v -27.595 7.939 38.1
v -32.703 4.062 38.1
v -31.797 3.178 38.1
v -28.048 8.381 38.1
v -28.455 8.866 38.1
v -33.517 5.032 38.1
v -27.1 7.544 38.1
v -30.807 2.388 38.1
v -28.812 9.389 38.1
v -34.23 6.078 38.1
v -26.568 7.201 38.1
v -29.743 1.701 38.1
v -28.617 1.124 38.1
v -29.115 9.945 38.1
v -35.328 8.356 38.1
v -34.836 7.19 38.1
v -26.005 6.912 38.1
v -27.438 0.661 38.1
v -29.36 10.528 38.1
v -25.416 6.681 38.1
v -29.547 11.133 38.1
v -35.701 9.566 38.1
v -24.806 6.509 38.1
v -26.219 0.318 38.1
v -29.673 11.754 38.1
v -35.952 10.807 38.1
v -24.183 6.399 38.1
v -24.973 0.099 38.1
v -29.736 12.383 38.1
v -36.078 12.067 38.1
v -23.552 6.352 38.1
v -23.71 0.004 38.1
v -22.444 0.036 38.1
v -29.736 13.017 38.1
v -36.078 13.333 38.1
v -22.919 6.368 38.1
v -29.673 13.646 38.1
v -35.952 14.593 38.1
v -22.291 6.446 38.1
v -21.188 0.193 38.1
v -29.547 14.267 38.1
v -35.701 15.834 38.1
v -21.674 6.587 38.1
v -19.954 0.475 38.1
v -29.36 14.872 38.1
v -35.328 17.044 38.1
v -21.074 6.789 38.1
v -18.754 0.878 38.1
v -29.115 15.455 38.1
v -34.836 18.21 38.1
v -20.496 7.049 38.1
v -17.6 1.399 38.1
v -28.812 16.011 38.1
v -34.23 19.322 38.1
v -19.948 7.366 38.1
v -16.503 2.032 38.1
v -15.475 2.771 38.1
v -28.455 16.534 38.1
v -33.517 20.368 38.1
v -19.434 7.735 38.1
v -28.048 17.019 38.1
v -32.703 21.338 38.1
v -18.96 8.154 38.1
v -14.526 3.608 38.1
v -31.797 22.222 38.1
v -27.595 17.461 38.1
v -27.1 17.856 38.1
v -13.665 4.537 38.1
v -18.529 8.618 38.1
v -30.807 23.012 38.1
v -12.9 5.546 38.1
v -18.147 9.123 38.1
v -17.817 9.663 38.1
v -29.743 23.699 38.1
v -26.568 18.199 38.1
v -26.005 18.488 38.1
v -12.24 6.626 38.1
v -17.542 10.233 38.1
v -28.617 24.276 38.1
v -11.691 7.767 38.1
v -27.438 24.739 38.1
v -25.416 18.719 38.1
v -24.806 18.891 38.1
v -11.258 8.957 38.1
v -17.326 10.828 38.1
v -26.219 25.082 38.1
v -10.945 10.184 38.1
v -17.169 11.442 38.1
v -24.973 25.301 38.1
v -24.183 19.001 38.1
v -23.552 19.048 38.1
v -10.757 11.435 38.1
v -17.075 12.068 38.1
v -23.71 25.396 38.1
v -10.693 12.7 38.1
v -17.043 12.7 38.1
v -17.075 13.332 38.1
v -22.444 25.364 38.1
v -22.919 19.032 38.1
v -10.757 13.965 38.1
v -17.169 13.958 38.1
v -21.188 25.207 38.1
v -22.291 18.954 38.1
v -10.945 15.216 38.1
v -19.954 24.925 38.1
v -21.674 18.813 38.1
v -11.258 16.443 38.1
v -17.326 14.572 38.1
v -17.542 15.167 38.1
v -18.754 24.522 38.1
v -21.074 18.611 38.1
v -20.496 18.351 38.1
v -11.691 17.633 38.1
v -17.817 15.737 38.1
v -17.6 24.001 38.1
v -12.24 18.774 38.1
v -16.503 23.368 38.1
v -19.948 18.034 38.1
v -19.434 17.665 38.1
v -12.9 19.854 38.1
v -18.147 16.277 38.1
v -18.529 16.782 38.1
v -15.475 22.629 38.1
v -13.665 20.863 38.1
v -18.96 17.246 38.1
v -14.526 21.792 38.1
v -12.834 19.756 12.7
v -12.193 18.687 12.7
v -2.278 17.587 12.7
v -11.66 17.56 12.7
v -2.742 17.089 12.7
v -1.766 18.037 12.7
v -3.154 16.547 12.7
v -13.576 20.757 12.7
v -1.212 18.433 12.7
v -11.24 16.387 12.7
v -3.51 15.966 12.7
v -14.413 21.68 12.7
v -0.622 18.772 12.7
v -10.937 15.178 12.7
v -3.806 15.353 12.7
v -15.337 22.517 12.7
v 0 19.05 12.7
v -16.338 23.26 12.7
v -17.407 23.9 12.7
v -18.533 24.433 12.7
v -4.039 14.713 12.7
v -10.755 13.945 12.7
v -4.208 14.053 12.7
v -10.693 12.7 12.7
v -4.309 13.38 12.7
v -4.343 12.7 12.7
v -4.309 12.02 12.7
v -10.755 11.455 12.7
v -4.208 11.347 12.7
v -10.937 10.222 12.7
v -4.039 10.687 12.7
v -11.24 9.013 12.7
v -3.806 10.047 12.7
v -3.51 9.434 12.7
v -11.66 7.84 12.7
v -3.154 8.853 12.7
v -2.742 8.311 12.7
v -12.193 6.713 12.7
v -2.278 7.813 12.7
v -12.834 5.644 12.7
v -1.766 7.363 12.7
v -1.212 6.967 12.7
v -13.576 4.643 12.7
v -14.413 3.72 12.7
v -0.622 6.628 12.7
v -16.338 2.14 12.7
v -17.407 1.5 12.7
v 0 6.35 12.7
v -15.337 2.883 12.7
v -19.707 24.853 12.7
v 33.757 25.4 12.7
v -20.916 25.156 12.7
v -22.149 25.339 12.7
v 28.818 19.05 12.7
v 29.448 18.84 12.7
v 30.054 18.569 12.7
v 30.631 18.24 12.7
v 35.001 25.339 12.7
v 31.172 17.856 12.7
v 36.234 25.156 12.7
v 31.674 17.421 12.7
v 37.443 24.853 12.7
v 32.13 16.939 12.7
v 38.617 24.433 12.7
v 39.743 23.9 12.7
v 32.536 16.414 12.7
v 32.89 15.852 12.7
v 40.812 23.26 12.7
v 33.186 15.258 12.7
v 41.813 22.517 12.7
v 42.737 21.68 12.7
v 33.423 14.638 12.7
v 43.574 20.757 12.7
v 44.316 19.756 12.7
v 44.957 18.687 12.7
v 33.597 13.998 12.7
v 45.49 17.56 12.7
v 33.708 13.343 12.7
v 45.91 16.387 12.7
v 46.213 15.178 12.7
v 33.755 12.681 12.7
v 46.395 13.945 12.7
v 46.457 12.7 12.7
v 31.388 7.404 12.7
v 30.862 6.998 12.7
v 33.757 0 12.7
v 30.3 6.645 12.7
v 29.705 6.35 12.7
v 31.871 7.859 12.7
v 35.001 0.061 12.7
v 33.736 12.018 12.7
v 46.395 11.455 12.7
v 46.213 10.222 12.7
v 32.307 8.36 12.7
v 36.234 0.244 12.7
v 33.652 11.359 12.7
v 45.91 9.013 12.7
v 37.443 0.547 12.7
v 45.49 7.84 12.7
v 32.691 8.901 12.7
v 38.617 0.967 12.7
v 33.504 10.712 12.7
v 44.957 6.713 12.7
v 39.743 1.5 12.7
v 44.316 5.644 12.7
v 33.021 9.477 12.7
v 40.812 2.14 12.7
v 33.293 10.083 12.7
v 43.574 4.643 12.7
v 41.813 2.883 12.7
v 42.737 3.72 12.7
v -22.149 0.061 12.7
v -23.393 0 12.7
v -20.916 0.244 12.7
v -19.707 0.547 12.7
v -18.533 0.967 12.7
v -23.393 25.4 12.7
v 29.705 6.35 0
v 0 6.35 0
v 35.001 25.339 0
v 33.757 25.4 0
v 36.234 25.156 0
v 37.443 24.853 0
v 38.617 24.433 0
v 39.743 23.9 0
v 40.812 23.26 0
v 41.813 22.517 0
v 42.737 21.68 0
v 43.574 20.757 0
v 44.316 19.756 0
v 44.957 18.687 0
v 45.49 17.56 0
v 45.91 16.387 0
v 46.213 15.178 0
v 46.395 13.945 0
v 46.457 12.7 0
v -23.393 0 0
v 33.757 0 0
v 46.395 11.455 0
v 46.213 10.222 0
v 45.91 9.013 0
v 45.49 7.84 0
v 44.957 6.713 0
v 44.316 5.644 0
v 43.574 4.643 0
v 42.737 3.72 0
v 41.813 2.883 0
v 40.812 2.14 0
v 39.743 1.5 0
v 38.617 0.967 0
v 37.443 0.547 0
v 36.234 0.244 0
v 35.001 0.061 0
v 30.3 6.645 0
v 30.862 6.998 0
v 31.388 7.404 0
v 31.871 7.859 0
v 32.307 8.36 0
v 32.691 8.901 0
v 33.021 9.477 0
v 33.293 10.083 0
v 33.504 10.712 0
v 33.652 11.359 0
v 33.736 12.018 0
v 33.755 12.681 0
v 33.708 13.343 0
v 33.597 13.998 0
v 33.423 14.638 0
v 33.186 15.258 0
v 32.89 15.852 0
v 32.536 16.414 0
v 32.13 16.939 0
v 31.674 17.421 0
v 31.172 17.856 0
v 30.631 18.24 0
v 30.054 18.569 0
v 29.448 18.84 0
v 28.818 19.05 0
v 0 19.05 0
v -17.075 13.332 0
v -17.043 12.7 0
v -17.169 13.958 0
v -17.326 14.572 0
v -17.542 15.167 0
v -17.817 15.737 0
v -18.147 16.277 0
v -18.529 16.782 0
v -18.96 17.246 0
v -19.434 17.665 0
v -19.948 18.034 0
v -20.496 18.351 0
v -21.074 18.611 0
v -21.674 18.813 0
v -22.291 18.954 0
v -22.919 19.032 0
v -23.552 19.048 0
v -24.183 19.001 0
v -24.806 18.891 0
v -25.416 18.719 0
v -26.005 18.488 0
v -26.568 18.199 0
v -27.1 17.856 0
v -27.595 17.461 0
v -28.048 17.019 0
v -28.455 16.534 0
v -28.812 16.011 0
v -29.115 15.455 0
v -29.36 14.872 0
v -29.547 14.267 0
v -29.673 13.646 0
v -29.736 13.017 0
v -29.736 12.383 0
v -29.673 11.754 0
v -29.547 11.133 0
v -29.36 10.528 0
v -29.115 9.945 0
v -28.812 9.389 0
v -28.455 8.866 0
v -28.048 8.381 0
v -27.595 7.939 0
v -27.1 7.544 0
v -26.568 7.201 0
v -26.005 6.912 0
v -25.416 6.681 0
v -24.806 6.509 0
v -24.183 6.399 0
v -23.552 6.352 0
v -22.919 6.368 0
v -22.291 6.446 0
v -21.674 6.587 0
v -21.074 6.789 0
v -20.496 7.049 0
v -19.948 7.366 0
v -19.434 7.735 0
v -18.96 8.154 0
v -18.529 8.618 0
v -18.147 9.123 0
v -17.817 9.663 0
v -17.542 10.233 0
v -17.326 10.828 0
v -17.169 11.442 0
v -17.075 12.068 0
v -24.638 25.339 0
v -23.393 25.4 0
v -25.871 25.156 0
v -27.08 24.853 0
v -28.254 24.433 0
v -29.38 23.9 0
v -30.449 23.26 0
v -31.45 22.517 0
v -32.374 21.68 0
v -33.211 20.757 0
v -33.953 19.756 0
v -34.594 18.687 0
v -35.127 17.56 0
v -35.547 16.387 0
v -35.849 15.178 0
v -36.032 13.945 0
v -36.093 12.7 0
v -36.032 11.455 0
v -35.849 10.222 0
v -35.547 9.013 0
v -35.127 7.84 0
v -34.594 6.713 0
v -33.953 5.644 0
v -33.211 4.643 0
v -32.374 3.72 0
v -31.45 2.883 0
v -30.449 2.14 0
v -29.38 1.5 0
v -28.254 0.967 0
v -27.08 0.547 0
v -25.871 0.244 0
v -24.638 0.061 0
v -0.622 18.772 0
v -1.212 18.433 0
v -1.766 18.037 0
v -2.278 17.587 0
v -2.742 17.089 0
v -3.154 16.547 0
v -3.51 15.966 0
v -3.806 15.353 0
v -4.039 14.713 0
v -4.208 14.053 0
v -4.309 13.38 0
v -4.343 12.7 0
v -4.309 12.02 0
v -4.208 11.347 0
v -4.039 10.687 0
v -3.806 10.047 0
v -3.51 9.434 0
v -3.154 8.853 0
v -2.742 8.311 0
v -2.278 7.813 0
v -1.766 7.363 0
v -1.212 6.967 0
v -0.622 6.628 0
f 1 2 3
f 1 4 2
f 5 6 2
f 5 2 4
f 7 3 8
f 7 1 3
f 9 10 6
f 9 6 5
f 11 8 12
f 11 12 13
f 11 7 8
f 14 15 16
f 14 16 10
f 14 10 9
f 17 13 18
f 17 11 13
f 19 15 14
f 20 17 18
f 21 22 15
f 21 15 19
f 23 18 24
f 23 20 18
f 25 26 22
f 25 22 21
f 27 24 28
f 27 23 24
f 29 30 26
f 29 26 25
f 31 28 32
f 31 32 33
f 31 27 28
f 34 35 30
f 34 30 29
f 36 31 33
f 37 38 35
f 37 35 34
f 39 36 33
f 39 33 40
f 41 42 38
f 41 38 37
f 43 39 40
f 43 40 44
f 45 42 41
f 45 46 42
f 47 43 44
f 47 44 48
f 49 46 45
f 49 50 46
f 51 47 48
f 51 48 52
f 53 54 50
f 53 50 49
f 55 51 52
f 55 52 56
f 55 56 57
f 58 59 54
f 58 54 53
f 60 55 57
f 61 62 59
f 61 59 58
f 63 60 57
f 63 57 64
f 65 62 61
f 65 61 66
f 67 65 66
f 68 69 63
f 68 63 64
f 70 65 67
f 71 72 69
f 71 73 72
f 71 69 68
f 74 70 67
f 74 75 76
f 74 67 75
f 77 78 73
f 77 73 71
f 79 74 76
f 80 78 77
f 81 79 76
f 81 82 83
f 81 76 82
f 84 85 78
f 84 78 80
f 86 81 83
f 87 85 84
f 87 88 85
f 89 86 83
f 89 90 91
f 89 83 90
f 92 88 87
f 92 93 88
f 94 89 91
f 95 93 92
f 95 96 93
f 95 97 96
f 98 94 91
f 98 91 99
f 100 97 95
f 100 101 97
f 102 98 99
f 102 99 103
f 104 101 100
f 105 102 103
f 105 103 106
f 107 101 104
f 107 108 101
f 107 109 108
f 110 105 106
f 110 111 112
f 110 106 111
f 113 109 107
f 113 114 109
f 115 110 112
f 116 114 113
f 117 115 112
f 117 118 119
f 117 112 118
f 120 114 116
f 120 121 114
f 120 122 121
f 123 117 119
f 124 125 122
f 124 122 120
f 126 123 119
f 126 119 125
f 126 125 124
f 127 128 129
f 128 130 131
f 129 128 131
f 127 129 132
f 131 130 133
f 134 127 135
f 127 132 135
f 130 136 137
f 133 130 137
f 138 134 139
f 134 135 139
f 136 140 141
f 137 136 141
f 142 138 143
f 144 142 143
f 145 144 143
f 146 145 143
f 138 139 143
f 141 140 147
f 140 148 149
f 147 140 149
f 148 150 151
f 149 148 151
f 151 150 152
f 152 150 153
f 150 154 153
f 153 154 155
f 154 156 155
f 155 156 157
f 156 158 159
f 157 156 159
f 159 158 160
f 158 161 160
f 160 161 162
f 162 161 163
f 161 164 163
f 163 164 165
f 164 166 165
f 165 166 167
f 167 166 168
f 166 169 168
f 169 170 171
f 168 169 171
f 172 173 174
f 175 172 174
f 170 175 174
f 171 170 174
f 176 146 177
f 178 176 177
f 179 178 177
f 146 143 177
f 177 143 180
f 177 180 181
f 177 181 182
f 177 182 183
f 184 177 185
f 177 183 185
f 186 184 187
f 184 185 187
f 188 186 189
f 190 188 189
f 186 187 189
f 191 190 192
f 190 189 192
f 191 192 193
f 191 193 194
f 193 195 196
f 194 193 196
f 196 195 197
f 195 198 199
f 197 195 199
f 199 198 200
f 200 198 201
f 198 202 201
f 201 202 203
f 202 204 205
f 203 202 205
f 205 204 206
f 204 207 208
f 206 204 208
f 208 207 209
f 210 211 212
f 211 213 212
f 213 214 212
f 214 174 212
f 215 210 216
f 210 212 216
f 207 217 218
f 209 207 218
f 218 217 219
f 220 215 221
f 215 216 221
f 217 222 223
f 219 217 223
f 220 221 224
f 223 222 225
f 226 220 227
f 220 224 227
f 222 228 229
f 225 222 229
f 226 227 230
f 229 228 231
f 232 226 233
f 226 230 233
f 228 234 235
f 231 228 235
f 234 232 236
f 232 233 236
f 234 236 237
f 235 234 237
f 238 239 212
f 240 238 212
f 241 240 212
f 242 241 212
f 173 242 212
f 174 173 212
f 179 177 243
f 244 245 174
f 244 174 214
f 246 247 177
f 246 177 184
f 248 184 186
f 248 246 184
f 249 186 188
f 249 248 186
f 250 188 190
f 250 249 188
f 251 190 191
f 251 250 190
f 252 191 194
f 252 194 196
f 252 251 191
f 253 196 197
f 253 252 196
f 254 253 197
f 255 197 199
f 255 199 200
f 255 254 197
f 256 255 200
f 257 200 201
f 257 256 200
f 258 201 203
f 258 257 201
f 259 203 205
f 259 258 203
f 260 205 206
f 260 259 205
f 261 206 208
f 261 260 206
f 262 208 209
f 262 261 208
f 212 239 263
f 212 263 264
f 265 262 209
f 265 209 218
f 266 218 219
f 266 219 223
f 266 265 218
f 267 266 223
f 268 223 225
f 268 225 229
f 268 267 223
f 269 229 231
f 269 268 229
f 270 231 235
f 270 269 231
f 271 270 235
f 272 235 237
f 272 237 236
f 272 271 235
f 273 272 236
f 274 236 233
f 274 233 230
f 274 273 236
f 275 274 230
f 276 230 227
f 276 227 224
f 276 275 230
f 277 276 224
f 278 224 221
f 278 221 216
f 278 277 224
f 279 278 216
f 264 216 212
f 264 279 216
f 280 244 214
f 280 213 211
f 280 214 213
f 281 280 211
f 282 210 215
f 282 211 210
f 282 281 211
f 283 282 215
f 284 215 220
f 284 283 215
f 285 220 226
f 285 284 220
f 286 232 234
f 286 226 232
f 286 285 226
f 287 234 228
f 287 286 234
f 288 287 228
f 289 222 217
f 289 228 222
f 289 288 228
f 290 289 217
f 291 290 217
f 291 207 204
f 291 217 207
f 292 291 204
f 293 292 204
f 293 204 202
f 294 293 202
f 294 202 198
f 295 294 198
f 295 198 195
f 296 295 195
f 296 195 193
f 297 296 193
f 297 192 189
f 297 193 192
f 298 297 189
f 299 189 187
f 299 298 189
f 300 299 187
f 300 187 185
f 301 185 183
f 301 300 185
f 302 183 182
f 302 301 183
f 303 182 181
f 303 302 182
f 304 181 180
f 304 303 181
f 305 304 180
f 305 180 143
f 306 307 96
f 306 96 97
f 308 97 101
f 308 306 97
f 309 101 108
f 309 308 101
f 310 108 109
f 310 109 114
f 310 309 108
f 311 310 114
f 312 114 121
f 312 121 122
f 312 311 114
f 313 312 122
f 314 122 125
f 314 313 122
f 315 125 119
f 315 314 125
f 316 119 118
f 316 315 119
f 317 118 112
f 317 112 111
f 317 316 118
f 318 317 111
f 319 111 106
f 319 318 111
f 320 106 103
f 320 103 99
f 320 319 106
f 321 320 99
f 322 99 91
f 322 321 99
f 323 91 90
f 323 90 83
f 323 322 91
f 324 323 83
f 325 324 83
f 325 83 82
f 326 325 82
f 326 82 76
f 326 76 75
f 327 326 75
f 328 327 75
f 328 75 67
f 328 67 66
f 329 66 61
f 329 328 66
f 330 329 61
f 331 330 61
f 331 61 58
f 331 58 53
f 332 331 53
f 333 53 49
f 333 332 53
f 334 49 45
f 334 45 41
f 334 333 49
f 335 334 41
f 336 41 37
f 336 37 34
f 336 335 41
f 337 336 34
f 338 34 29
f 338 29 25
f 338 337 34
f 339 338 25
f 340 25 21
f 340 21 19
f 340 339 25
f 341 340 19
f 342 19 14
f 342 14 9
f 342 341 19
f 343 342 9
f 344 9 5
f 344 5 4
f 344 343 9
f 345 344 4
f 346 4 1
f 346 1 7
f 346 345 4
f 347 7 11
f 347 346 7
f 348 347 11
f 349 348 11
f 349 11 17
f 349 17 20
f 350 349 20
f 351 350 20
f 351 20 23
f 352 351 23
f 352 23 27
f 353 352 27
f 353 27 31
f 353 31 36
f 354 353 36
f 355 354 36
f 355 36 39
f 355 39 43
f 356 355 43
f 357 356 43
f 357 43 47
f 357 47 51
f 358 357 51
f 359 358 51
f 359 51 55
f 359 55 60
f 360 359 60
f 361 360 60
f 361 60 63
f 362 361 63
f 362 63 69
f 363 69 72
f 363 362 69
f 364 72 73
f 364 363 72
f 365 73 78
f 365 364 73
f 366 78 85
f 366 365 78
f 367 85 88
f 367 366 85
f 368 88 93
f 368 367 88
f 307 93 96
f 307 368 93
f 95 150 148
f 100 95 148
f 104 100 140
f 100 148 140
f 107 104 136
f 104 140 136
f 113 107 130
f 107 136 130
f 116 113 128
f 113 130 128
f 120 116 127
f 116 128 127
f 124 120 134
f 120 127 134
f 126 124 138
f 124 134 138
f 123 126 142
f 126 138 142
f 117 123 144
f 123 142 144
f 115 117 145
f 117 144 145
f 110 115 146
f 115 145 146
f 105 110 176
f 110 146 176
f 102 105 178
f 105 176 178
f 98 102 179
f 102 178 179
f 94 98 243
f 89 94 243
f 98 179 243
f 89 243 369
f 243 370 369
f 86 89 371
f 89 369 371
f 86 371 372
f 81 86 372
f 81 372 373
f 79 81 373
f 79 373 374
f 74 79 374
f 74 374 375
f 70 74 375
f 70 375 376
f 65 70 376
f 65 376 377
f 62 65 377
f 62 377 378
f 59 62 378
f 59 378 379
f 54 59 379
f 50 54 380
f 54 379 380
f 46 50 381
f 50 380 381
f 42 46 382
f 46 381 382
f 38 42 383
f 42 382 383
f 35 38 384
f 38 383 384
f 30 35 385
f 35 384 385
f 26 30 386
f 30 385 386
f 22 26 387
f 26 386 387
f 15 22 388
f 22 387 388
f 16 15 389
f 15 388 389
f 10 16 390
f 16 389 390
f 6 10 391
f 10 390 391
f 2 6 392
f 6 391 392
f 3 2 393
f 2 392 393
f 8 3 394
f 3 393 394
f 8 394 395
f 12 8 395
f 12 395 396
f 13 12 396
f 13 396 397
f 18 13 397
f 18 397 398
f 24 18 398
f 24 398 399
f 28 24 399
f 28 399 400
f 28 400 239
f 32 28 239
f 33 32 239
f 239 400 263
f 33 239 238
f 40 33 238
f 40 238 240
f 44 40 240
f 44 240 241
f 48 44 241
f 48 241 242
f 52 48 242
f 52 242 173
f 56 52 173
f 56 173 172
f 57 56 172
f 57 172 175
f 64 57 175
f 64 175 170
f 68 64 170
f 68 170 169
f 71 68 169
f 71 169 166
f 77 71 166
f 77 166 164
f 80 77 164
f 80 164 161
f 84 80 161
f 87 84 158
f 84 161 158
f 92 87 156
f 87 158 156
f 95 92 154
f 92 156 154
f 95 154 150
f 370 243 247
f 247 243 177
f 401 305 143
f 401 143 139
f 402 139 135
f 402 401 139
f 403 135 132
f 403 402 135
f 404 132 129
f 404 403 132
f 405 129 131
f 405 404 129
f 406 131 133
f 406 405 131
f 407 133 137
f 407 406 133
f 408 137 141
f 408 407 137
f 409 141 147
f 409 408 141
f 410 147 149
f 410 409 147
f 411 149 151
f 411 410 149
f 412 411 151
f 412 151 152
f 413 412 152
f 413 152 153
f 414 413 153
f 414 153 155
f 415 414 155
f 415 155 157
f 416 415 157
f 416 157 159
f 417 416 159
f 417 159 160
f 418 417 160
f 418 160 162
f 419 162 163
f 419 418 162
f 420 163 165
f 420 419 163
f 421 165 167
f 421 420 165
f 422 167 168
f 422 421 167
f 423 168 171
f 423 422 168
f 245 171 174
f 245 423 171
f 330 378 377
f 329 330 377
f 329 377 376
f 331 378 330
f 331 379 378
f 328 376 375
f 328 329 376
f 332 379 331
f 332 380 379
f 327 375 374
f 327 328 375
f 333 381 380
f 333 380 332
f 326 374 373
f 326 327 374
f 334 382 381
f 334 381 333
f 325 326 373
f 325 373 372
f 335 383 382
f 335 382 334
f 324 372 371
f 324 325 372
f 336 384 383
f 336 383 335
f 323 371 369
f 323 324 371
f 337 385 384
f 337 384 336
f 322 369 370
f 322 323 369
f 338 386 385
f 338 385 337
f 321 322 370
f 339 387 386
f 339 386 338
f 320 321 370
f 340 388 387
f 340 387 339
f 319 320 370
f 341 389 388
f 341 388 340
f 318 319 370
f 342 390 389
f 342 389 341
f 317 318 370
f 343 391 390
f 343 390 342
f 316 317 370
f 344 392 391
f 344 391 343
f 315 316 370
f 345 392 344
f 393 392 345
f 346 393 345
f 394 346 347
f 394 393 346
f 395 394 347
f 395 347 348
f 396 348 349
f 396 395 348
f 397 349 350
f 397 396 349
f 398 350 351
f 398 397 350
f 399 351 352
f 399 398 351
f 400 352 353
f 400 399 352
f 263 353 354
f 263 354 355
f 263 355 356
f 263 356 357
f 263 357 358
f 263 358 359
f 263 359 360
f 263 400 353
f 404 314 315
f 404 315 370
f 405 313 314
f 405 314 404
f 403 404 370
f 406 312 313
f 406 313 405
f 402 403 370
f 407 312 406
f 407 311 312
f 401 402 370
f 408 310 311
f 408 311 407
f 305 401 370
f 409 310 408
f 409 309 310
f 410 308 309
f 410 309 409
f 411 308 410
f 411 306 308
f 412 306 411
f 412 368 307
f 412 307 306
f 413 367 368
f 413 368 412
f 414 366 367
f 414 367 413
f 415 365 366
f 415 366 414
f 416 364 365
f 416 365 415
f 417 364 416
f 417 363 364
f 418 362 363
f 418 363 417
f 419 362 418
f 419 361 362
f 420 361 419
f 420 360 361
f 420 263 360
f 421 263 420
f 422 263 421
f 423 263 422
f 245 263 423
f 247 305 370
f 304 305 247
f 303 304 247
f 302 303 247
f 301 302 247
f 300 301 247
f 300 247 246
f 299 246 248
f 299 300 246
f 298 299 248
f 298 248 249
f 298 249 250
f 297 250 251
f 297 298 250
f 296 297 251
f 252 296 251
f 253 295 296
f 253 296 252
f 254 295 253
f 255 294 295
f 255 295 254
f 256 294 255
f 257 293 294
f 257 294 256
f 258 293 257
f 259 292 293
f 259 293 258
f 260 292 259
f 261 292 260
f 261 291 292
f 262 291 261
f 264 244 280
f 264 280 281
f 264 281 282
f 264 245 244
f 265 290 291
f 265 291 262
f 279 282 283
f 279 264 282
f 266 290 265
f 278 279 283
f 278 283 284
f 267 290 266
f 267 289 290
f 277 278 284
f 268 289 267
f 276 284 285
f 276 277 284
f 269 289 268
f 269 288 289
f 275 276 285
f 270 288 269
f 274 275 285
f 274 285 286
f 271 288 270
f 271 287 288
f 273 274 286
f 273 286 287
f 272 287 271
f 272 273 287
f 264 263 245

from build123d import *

# Parameters (mm, degrees)
F0_W      = 82.55
F0_H      = 38.1
F1_DEPTH  = 25.4
F2_W      = 57.15
F2_H      = 25.4
F3_DEPTH  = 25.4
F5_DEPTH  = 25.4
F7_DEPTH  = 25.4
F8_W      = 25.4
F8_H      = 25.4
F9_DEPTH  = 25.4
F10_R     = 12.7
F11_DEPTH = 25.4
F12_R     = 6.35
F13_DEPTH = 38.1
F14_DEPTH = 25.4


with BuildPart() as f1:
    # F0 (on Front) → F1 (new body)
    with BuildSketch(Plane.XZ):
        with Locations((5.1815754888, 19.05)):
            Rectangle(F0_W, F0_H)
    extrude(amount=-F1_DEPTH)

    # F2 (on Front) → F3 (cut)
    with BuildSketch(Plane.XZ):
        with Locations((17.8815754888, 25.4)):
            Rectangle(F2_W, F2_H)
    extrude(amount=-F3_DEPTH, mode=Mode.SUBTRACT)

    # F4 (on Top) → F5 (cut)
    with BuildSketch(Plane.XY):
        with BuildLine():
            ThreePointArc((33.7565754888, 25.4), (42.7368316099, 21.6802561211), (46.4565754888, 12.7))
            Line((46.4565754888, 12.7), (46.4565754888, 25.4))
            Line((46.4565754888, 25.4), (33.7565754888, 25.4))
        make_face()
        with BuildLine():
            ThreePointArc((46.4565754888, 12.7), (42.7368316099, 3.7197438789), (33.7565754888, 0))
            Line((33.7565754888, 0), (46.4565754888, 0))
            Line((46.4565754888, 0), (46.4565754888, 12.7))
        make_face()
    extrude(amount=F5_DEPTH, mode=Mode.SUBTRACT)

    # F6 (on Top) → F7 (cut)
    with BuildSketch(Plane.XY):
        with BuildLine():
            Line((28.8184100731, 19.05), (0, 19.05))
            ThreePointArc((0, 19.05), (-4.3434245112, 12.7), (0, 6.35))
            Line((0, 6.35), (29.70539537, 6.35))
            ThreePointArc((29.70539537, 6.35), (33.7396442751, 13.0127315686), (28.8184100731, 19.05))
        make_face()
    extrude(amount=F7_DEPTH, mode=Mode.SUBTRACT)

    # F8 (on face) → F9 (cut)
    with BuildSketch(Plane.XZ):
        with Locations((-23.3934245112, 25.4)):
            Rectangle(F8_W, F8_H)
    extrude(amount=-F9_DEPTH, mode=Mode.SUBTRACT)

    # F10 (on face) → F11 (join)
    with BuildSketch(Plane.XY.offset(12.7)):
        with Locations((-23.3934245112, 12.7)):
            Circle(F10_R)
    extrude(amount=F11_DEPTH)

    # F12 (on Top) → F13 (cut)
    with BuildSketch(Plane.XY):
        with Locations((-23.3934245112, 12.7)):
            Circle(F12_R)
    extrude(amount=F13_DEPTH, mode=Mode.SUBTRACT)

    # F14 (cut): faces of the model
    f14_faces = [f1.faces().sort_by_distance(p)[0] for p in [
        (-33.2566516865, 22.5632271754, 12.7),
        (-33.2566516865, 2.8367728246, 12.7),
    ]]
    extrude(f14_faces, amount=-F14_DEPTH, mode=Mode.SUBTRACT)


solid = f1.part
